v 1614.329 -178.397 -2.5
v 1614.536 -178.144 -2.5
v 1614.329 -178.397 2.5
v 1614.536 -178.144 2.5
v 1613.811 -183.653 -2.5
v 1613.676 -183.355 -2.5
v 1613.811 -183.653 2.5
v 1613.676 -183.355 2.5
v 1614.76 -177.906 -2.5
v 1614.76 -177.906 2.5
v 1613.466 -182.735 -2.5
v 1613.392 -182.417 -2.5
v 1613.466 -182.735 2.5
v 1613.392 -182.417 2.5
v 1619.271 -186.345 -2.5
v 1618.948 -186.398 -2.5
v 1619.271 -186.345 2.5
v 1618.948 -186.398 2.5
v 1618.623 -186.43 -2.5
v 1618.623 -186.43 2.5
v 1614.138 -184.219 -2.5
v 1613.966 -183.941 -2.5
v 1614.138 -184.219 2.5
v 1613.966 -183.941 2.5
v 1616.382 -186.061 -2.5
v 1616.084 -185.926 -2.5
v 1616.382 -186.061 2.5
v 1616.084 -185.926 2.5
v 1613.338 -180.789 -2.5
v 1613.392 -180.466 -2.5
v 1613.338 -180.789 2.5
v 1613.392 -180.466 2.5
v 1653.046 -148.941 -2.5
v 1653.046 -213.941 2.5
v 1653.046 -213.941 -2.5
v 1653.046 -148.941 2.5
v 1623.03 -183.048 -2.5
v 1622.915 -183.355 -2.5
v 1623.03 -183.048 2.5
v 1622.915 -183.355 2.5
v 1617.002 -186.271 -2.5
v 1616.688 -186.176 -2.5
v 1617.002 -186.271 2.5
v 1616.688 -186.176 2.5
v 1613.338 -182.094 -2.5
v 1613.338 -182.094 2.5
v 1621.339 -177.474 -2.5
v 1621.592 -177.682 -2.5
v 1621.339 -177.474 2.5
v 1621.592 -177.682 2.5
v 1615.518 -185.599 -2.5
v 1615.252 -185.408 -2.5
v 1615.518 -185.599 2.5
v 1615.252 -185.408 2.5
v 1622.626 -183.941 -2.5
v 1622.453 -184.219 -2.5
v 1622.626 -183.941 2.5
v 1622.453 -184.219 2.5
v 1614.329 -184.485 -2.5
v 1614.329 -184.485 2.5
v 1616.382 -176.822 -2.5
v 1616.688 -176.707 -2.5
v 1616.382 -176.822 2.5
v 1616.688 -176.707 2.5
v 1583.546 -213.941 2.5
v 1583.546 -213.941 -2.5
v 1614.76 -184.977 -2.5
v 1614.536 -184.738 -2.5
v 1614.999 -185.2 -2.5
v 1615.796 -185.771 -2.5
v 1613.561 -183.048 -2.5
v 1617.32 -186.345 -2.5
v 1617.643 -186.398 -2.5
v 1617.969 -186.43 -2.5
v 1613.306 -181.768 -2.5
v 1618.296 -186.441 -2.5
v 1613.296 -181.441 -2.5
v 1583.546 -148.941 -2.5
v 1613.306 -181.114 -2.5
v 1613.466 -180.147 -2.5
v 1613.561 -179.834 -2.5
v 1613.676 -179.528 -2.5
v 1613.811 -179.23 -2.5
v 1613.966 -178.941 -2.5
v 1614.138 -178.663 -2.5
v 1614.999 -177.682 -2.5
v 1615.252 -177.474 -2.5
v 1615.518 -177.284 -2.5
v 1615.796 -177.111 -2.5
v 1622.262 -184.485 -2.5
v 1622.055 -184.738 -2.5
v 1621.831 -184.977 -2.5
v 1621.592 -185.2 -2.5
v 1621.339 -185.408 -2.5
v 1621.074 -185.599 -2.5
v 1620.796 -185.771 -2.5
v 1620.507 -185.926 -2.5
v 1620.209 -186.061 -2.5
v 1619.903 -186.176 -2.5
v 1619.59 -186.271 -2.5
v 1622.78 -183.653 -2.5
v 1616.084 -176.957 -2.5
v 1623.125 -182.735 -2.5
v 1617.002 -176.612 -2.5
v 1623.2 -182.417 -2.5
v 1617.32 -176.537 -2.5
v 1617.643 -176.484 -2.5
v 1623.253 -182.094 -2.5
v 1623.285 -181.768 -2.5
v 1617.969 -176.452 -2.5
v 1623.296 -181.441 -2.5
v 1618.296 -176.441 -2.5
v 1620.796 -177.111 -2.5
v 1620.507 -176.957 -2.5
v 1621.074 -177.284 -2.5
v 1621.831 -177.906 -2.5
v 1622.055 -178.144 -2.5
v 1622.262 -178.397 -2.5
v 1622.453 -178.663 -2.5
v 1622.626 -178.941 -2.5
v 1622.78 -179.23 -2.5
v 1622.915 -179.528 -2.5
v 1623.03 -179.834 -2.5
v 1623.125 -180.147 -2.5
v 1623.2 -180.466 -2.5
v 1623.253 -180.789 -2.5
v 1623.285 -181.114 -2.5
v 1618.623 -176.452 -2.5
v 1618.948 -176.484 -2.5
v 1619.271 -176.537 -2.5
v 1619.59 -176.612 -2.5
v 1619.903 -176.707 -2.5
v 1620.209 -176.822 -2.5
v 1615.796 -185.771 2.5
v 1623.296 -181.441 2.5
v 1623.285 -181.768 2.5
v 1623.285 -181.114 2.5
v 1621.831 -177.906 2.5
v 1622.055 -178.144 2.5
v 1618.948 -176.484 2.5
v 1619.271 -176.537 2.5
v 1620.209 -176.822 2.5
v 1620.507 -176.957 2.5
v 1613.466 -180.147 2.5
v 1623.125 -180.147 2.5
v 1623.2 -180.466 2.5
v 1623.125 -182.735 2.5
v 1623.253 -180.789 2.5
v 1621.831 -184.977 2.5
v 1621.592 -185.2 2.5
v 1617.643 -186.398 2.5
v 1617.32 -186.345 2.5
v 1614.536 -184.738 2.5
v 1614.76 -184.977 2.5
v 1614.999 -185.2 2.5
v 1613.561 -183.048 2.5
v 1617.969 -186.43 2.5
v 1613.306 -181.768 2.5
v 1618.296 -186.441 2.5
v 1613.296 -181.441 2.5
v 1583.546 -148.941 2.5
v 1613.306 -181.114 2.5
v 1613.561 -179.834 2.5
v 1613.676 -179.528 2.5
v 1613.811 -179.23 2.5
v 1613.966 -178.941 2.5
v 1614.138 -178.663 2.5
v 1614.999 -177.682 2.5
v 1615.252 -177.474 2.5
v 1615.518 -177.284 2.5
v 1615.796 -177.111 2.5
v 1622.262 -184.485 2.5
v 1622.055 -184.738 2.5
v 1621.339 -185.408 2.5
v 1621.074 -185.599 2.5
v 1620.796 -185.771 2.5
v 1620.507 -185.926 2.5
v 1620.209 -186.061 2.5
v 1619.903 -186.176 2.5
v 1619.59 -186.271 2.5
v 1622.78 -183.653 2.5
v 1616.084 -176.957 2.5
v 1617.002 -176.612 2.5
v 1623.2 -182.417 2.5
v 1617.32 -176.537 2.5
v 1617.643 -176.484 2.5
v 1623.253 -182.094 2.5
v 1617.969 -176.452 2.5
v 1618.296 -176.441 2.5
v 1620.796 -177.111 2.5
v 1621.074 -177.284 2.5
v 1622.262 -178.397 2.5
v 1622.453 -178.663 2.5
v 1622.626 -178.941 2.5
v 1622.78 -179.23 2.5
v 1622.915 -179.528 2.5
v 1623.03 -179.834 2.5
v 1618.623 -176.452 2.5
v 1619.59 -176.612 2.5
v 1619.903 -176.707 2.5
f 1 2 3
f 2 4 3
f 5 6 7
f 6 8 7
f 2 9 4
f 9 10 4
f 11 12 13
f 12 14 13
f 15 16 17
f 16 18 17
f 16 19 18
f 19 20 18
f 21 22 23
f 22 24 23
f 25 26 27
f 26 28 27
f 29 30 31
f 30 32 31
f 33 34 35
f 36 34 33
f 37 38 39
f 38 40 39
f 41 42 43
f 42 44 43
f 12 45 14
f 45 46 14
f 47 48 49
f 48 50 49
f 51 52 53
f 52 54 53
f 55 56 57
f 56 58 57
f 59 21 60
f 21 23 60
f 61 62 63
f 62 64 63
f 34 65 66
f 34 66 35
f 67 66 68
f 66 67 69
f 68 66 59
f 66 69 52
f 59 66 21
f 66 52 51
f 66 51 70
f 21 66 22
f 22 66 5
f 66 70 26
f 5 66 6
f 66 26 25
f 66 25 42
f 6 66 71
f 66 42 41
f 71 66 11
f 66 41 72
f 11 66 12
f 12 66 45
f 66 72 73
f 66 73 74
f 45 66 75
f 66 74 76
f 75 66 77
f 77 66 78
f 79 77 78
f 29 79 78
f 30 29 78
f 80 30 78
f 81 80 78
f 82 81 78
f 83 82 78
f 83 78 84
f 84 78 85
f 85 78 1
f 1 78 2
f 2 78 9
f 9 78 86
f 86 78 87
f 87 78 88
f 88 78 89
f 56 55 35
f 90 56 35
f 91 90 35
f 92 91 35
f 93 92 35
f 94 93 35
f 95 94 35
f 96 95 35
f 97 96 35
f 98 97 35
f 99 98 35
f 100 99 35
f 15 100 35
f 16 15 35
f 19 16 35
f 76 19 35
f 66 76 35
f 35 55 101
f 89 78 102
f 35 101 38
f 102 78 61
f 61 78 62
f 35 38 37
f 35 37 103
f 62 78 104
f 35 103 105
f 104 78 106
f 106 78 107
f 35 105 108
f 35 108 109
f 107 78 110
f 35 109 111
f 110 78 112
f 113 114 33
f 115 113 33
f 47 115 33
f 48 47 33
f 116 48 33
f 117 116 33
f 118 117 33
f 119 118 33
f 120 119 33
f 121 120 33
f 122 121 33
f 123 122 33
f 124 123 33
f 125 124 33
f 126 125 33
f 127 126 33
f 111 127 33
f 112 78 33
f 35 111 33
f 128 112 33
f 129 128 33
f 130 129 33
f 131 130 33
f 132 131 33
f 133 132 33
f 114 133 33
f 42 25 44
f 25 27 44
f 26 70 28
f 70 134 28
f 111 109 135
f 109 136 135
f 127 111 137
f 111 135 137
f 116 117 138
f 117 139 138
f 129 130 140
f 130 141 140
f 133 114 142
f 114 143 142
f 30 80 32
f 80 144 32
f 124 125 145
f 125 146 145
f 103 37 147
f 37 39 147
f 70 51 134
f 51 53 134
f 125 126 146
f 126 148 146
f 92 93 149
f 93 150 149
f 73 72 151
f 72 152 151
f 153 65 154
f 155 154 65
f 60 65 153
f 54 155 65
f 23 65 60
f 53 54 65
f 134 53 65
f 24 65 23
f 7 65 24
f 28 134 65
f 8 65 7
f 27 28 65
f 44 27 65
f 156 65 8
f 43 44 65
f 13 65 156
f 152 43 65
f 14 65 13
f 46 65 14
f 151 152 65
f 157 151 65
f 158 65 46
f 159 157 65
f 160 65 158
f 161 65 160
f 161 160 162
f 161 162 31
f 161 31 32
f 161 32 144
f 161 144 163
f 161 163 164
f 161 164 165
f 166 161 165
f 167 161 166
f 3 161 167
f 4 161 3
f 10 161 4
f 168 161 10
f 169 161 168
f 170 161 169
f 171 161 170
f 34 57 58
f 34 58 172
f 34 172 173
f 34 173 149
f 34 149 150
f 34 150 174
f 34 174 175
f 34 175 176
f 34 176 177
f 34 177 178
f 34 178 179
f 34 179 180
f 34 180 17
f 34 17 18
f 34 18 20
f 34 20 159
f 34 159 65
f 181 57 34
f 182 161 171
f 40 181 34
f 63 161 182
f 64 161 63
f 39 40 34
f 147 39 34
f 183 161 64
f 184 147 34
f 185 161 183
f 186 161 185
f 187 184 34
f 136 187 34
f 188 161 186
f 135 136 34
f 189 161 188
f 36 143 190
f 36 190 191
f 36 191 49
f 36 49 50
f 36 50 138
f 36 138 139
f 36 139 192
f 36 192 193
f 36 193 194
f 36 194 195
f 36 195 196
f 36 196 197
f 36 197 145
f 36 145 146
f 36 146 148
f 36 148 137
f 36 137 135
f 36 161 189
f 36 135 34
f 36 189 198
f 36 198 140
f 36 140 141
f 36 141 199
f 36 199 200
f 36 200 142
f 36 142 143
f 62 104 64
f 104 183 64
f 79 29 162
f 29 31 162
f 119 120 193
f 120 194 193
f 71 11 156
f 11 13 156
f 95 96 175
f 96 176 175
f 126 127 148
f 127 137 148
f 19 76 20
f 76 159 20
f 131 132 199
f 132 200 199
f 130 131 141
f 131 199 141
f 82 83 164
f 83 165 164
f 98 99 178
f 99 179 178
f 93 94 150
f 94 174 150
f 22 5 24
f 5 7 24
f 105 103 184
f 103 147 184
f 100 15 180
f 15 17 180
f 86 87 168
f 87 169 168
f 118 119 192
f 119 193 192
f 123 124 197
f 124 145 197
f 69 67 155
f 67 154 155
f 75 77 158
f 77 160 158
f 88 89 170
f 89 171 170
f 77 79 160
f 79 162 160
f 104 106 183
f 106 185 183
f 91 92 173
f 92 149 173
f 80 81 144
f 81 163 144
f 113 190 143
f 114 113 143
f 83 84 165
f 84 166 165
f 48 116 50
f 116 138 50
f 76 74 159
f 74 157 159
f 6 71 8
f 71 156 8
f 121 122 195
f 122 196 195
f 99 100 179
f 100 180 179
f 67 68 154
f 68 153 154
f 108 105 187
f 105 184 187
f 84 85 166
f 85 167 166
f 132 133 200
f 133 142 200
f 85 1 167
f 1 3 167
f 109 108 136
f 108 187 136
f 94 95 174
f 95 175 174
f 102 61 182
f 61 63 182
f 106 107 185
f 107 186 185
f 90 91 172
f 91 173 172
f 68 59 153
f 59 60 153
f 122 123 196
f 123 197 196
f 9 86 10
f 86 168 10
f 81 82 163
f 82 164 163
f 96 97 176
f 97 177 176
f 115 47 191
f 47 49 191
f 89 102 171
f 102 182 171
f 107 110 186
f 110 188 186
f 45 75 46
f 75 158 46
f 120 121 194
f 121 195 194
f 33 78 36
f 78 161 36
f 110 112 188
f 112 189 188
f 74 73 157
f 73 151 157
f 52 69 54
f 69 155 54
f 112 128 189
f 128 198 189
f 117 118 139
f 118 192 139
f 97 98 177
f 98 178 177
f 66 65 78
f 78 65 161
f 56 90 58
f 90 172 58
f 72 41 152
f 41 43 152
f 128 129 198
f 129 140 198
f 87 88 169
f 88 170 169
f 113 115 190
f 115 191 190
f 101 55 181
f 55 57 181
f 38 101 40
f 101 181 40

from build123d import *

# Parameters (mm, degrees)
SKETCH1_W           = 69.5
SKETCH1_H           = 65
BOSS_EXTRUDE1_DEPTH = 2.5


with BuildPart() as part:
    # Sketch1 → Boss-Extrude1 (new, symmetric)
    with BuildSketch(Plane.XY):
        with Locations((1618.295659386, -181.441167375)):
            Rectangle(SKETCH1_W, SKETCH1_H)
        Polygon((1620.795659386, -177.111040356), (1620.507102837, -176.956803667), (1620.209076548, -176.821769712), (1619.902856712, -176.706516727), (1619.589754611, -176.611538243), (1619.271110996, -176.537240973), (1618.948290347, -176.483943068), (1618.622675032, -176.451872759), (1618.295659386, -176.441167375), (1617.96864374, -176.451872759), (1617.643028425, -176.483943068), (1617.320207776, -176.537240973), (1617.00156416, -176.611538243), (1616.688462059, -176.706516727), (1616.382242224, -176.821769712), (1616.084215935, -176.956803667), (1615.795659386, -177.111040356), (1615.517808221, -177.283819313), (1615.251852241, -177.474400673), (1614.99893031, -177.681968337), (1614.76012548, -177.905633469), (1614.536460348, -178.144438299), (1614.328892684, -178.39736023), (1614.138311324, -178.66331621), (1613.965532367, -178.941167375), (1613.811295678, -179.229723924), (1613.676261723, -179.527750213), (1613.561008738, -179.833970048), (1613.466030254, -180.147072149), (1613.391732984, -180.465715765), (1613.338435079, -180.788536414), (1613.30636477, -181.114151729), (1613.295659386, -181.441167375), (1613.30636477, -181.768183021), (1613.338435079, -182.093798336), (1613.391732984, -182.416618985), (1613.466030254, -182.7352626), (1613.561008738, -183.048364701), (1613.676261723, -183.354584537), (1613.811295678, -183.652610826), (1613.965532367, -183.941167375), (1614.138311324, -184.21901854), (1614.328892684, -184.48497452), (1614.536460348, -184.73789645), (1614.76012548, -184.976701281), (1614.99893031, -185.200366412), (1615.251852241, -185.407934076), (1615.517808221, -185.598515436), (1615.795659386, -185.771294394), (1616.084215935, -185.925531082), (1616.382242224, -186.060565037), (1616.688462059, -186.175818022), (1617.00156416, -186.270796506), (1617.320207776, -186.345093777), (1617.643028425, -186.398391682), (1617.96864374, -186.430461991), (1618.295659386, -186.441167375), (1618.622675032, -186.430461991), (1618.948290347, -186.398391682), (1619.271110996, -186.345093777), (1619.589754611, -186.270796506), (1619.902856712, -186.175818022), (1620.209076548, -186.060565037), (1620.507102837, -185.925531082), (1620.795659386, -185.771294394), (1621.073510551, -185.598515436), (1621.339466531, -185.407934076), (1621.592388461, -185.200366412), (1621.831193292, -184.976701281), (1622.054858423, -184.73789645), (1622.262426087, -184.48497452), (1622.453007447, -184.21901854), (1622.625786405, -183.941167375), (1622.780023094, -183.652610826), (1622.915057048, -183.354584537), (1623.030310033, -183.048364701), (1623.125288517, -182.7352626), (1623.199585788, -182.416618985), (1623.252883693, -182.093798336), (1623.284954002, -181.768183021), (1623.295659386, -181.441167375), (1623.284954002, -181.114151729), (1623.252883693, -180.788536414), (1623.199585788, -180.465715765), (1623.125288517, -180.147072149), (1623.030310033, -179.833970048), (1622.915057048, -179.527750213), (1622.780023094, -179.229723924), (1622.625786405, -178.941167375), (1622.453007447, -178.66331621), (1622.262426087, -178.39736023), (1622.054858423, -178.144438299), (1621.831193292, -177.905633469), (1621.592388461, -177.681968337), (1621.339466531, -177.474400673), (1621.073510551, -177.283819313), align=None, mode=Mode.SUBTRACT)
    extrude(amount=BOSS_EXTRUDE1_DEPTH, both=True)


solid = part.part
